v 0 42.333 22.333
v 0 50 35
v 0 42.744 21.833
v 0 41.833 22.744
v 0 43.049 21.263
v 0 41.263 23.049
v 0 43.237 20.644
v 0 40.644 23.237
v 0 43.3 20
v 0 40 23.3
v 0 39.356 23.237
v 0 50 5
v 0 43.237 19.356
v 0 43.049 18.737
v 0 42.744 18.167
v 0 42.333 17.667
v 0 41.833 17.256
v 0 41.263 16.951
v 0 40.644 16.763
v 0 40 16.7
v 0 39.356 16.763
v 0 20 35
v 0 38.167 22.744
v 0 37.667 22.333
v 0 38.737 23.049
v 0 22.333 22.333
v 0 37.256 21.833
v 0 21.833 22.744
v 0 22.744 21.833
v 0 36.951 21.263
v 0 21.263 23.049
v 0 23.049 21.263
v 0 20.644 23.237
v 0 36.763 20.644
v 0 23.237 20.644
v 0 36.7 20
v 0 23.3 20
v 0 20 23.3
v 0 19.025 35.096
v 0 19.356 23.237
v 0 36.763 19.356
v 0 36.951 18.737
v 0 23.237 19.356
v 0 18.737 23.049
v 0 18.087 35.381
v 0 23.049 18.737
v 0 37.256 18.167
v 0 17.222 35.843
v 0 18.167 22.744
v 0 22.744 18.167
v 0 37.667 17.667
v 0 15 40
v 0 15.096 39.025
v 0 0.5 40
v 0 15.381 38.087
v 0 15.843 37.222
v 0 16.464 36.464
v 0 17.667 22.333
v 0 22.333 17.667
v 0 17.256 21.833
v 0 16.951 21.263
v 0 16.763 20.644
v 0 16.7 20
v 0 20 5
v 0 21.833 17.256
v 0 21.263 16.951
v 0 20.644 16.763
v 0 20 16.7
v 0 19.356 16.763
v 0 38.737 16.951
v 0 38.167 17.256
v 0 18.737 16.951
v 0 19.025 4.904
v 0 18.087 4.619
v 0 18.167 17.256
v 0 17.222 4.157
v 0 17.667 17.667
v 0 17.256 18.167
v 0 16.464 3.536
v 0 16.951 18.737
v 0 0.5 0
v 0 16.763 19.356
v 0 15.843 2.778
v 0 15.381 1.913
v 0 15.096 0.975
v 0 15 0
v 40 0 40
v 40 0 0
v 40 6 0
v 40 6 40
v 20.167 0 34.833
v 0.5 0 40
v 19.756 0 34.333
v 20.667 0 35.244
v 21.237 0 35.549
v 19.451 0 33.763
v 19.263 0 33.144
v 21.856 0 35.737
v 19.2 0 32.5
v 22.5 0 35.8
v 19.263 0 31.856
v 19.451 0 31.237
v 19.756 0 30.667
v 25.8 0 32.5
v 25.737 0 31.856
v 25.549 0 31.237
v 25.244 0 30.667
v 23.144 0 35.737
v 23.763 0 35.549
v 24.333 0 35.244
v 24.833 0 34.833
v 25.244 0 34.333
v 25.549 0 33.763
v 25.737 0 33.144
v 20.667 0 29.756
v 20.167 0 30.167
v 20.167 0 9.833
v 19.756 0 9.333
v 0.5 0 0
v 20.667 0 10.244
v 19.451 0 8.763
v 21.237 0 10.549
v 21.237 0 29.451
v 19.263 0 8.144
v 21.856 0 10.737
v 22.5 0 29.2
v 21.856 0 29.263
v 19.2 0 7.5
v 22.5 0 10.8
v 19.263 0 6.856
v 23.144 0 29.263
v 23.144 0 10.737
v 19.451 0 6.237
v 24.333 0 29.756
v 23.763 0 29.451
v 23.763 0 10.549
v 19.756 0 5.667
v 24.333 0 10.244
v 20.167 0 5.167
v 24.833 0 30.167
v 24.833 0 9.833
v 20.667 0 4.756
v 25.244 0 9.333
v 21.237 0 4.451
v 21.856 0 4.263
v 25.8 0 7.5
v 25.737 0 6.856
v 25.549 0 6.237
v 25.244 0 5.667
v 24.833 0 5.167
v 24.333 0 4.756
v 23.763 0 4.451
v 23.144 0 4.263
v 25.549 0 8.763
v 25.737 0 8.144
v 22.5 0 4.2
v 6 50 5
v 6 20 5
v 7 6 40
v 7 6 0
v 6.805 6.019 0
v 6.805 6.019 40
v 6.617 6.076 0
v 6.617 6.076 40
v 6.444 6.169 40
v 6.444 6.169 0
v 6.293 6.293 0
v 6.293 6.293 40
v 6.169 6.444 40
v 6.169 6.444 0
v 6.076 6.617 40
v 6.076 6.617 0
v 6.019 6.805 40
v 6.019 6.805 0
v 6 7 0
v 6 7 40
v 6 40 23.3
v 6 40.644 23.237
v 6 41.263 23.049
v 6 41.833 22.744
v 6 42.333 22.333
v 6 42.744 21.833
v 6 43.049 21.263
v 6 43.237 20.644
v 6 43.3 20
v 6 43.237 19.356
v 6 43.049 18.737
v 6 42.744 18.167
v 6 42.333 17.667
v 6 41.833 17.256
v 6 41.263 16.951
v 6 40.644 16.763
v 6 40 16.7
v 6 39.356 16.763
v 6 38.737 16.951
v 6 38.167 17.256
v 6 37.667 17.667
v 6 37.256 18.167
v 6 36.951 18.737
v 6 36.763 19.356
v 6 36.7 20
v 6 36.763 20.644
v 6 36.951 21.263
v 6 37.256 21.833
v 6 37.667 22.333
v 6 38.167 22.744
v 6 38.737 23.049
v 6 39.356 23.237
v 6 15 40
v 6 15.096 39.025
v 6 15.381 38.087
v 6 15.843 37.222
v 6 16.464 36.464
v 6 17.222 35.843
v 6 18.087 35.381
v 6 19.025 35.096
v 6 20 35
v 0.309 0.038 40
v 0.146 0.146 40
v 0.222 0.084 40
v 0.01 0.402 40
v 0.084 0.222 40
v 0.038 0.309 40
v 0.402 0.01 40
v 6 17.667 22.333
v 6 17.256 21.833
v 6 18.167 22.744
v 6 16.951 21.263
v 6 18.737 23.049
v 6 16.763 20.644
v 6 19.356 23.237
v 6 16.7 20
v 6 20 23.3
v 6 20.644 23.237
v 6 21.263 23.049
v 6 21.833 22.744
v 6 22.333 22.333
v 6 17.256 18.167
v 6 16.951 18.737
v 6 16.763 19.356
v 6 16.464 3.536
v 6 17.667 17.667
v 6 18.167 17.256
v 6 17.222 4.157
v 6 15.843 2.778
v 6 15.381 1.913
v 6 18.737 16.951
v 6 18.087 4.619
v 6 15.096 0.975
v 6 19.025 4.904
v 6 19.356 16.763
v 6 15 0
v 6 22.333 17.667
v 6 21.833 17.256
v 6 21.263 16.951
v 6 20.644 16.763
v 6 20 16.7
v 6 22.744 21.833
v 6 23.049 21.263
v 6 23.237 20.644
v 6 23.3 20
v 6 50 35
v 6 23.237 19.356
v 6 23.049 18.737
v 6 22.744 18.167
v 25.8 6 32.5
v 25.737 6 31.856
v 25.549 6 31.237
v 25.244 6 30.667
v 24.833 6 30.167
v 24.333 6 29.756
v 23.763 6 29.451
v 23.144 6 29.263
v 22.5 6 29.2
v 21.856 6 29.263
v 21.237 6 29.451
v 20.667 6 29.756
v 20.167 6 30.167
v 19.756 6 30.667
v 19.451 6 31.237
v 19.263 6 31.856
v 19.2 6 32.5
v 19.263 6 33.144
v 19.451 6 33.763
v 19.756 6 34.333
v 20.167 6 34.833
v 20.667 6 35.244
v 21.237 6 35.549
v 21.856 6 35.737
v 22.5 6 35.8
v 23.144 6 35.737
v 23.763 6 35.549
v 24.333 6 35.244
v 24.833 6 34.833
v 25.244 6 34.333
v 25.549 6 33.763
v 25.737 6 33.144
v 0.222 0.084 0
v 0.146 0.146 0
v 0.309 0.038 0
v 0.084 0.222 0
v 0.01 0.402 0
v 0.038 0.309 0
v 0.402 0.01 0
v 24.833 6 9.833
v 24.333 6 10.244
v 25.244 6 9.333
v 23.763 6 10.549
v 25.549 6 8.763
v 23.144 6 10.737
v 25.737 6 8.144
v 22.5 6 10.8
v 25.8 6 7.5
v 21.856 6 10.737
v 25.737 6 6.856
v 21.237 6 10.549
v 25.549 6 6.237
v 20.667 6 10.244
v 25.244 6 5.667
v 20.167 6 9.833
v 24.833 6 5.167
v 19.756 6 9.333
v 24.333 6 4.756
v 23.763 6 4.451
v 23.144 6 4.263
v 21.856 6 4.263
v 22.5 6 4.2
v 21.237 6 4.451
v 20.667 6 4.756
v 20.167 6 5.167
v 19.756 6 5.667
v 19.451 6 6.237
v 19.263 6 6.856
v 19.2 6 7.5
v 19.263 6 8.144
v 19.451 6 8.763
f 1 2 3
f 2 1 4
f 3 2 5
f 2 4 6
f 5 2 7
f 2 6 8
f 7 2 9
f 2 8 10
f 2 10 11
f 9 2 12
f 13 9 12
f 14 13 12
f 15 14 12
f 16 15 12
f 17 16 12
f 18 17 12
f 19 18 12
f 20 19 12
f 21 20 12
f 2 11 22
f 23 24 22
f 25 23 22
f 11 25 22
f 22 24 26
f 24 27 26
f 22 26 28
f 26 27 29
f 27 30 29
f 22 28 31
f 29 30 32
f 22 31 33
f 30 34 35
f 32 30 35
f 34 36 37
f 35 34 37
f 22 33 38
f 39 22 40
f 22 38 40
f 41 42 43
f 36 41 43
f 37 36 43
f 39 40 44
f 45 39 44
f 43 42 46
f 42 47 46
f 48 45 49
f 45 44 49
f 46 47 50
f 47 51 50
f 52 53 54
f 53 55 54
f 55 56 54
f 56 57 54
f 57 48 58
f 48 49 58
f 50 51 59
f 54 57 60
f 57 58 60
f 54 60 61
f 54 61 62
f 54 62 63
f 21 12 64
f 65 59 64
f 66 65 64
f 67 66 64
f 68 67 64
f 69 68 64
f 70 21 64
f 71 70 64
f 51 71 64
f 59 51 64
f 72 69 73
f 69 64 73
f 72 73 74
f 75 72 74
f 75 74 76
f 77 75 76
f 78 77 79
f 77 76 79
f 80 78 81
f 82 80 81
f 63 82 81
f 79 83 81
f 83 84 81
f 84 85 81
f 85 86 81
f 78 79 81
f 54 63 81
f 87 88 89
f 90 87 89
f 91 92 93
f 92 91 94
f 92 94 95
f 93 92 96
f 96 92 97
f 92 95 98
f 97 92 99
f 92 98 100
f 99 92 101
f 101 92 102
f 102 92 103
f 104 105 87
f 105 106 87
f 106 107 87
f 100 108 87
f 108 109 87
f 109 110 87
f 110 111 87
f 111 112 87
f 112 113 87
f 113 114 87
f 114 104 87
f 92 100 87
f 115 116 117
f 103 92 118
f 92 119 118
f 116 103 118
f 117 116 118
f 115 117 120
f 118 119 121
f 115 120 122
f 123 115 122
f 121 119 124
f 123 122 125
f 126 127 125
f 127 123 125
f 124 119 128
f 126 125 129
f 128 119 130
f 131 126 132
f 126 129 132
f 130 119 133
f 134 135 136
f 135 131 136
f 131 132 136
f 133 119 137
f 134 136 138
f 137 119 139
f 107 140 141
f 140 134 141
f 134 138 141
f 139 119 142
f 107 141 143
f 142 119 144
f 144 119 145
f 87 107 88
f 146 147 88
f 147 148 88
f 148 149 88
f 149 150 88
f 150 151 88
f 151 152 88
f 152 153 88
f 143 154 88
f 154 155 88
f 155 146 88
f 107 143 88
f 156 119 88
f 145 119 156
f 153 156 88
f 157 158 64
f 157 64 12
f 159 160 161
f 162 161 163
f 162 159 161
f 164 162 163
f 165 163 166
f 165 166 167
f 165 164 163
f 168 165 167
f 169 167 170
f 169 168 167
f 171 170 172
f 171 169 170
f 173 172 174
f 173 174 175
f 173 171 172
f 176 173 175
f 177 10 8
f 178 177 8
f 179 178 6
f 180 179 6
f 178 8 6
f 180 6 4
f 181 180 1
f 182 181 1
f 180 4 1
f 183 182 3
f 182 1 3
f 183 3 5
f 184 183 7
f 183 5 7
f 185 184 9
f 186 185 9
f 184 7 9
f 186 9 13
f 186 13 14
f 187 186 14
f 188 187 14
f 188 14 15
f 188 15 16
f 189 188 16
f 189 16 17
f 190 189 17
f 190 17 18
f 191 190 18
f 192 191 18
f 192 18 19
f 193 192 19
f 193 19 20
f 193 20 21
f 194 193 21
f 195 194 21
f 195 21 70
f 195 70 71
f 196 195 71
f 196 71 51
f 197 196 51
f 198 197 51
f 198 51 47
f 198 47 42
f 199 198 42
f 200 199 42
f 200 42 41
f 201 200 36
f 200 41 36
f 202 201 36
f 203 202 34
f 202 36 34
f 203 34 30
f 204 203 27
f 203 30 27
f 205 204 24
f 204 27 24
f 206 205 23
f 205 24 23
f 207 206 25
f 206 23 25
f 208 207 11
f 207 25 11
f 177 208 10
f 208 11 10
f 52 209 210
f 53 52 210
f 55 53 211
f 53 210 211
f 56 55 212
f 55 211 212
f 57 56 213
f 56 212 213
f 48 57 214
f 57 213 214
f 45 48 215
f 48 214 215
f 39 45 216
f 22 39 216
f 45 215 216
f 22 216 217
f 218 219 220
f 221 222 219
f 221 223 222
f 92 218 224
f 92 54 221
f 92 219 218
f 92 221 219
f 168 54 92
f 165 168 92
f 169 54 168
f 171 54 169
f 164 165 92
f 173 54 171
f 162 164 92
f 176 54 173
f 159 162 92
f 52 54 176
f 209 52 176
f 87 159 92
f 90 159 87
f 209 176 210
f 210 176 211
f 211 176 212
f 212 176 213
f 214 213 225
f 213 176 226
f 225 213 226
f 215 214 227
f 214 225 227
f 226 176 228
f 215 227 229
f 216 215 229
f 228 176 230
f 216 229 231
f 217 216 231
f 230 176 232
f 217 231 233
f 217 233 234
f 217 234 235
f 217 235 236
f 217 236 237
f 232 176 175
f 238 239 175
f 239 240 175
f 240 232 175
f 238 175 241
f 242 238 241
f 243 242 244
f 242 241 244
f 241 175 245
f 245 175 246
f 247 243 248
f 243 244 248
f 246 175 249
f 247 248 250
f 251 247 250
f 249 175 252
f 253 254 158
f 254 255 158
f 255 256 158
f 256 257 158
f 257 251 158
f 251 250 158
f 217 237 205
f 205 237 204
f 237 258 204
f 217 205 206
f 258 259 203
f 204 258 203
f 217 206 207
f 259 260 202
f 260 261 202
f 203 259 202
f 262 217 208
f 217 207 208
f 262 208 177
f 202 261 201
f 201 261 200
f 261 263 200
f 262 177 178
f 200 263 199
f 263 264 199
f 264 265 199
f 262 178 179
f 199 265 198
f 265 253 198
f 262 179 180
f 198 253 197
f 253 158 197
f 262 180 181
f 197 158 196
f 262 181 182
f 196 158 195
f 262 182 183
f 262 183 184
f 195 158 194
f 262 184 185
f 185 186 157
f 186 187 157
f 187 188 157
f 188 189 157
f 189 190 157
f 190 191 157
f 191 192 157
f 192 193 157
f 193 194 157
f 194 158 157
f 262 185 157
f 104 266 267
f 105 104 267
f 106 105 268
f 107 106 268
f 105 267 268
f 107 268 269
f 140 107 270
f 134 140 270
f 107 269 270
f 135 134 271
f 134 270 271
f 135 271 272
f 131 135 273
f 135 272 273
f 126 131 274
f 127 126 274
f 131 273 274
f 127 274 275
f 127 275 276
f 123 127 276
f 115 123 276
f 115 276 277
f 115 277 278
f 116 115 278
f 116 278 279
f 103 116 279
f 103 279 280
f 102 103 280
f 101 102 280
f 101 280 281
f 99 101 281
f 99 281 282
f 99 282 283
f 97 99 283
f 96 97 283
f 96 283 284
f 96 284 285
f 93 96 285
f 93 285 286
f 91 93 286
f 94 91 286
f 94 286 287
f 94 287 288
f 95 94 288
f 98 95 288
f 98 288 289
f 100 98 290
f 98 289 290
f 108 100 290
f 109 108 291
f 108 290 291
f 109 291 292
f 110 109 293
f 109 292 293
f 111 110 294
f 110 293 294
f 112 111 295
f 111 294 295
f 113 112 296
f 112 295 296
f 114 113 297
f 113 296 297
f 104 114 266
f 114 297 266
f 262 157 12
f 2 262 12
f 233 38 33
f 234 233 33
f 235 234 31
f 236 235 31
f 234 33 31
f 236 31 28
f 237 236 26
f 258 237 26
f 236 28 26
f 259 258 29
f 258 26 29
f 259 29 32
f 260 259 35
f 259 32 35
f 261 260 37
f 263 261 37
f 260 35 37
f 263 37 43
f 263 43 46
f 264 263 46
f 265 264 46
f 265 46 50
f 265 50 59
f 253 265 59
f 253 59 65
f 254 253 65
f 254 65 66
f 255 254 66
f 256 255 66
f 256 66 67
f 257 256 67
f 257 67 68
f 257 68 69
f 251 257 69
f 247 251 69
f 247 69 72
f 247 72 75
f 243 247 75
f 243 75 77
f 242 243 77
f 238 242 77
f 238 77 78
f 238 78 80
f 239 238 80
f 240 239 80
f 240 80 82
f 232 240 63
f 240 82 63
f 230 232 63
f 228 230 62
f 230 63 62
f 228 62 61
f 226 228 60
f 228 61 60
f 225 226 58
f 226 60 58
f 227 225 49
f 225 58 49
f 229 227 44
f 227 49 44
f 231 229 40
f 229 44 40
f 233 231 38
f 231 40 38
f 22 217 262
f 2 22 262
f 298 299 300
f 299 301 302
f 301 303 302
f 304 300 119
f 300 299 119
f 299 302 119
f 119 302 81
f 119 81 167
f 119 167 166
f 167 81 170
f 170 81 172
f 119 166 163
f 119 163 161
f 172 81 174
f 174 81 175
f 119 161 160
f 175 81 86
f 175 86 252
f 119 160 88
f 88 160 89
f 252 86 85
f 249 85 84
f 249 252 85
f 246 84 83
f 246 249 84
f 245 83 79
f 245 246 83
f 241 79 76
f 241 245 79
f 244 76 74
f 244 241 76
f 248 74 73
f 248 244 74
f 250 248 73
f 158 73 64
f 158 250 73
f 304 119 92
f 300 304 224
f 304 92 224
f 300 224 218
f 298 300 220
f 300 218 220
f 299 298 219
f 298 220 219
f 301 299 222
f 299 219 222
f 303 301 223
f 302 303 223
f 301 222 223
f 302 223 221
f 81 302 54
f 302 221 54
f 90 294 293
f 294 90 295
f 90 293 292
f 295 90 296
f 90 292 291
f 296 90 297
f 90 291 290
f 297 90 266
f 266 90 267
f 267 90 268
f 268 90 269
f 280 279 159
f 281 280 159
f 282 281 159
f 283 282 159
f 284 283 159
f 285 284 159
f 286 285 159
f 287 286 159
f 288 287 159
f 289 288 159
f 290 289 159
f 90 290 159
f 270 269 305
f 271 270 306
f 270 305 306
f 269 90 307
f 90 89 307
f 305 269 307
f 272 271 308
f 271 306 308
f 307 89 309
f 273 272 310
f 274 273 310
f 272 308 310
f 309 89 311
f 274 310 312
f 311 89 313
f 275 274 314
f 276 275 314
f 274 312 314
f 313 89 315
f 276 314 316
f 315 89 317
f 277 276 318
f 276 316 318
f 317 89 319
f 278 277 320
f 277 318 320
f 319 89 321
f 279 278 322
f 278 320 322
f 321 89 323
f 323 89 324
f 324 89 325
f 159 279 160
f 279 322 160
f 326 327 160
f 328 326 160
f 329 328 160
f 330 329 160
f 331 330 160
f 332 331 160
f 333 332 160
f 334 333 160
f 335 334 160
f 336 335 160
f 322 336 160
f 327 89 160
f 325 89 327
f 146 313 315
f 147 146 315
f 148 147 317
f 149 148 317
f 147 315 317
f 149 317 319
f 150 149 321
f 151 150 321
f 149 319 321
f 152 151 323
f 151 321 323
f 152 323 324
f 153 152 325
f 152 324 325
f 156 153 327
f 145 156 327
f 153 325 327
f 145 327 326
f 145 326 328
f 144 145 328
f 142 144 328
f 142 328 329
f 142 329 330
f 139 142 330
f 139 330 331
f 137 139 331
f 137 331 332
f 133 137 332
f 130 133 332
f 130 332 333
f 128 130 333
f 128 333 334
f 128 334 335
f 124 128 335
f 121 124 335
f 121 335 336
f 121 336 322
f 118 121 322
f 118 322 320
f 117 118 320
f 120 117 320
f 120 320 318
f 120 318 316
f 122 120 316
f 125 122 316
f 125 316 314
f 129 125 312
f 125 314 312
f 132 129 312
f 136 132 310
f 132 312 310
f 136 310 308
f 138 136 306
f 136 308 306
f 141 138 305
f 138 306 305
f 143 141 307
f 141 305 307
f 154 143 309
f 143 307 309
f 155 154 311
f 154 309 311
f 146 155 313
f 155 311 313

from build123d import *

# Parameters (mm, degrees)
BOSS_EXTRUDE1_DEPTH  = 40
M6_CLEARANCE_HOLE1_D = 6.6
M6_CLEARANCE_HOLE2_D = 6.6
FILLET1_R            = 1
FILLET2_R            = 0.5
CUT_EXTRUDE1_DEPTH   = 73.498275842


with BuildPart() as part:
    # Sketch1 → Boss-Extrude1 (new body)
    with BuildSketch(Plane.XY):
        Polygon((0, 0), (40, 0), (40, 6), (6, 6), (6, 50), (0, 50), align=None)
    extrude(amount=BOSS_EXTRUDE1_DEPTH)

    # M6 Clearance Hole1 (through all)
    with Locations(Plane(origin=(6, 0, 0), x_dir=(0, 0, -1), z_dir=(1, 0, 0))):
        with Locations((-20, 40), (-20, 20)):
            Hole(M6_CLEARANCE_HOLE1_D / 2)

    # M6 Clearance Hole2 (through all)
    with Locations(Plane(origin=(0, 0, 0), x_dir=(-1, 0, 0), z_dir=(0, -1, 0))):
        with Locations((-22.5, -32.5), (-22.5, -7.5)):
            Hole(M6_CLEARANCE_HOLE2_D / 2)

    # Fillet1
    fillet1_edges = [part.edges().sort_by_distance(p)[0] for p in [
        (6, 6, 20),
    ]]
    fillet(fillet1_edges, radius=FILLET1_R)

    # Fillet2
    fillet2_edges = [part.edges().sort_by_distance(p)[0] for p in [
        (0, 0, 20),
    ]]
    fillet(fillet2_edges, radius=FILLET2_R)

    # Sketch7 → Cut-Extrude1 (cut, through all)
    with BuildSketch(Plane(origin=(6, 0, 0), x_dir=(0, 0, -1), z_dir=(1, 0, 0))):
        with BuildLine():
            Line((-5, 50), (0, 50))
            Line((0, 50), (0, 15))
            ThreePointArc((0, 15), (-3.535533906, 16.464466094), (-5, 20))
            Line((-5, 20), (-5, 50))
        make_face()
        with BuildLine():
            Line((-35, 20), (-35, 50))
            Line((-35, 50), (-40, 50))
            Line((-40, 50), (-40, 15))
            ThreePointArc((-40, 15), (-36.464466094, 16.464466094), (-35, 20))
        make_face()
    extrude(amount=-CUT_EXTRUDE1_DEPTH, mode=Mode.SUBTRACT)


solid = part.part
